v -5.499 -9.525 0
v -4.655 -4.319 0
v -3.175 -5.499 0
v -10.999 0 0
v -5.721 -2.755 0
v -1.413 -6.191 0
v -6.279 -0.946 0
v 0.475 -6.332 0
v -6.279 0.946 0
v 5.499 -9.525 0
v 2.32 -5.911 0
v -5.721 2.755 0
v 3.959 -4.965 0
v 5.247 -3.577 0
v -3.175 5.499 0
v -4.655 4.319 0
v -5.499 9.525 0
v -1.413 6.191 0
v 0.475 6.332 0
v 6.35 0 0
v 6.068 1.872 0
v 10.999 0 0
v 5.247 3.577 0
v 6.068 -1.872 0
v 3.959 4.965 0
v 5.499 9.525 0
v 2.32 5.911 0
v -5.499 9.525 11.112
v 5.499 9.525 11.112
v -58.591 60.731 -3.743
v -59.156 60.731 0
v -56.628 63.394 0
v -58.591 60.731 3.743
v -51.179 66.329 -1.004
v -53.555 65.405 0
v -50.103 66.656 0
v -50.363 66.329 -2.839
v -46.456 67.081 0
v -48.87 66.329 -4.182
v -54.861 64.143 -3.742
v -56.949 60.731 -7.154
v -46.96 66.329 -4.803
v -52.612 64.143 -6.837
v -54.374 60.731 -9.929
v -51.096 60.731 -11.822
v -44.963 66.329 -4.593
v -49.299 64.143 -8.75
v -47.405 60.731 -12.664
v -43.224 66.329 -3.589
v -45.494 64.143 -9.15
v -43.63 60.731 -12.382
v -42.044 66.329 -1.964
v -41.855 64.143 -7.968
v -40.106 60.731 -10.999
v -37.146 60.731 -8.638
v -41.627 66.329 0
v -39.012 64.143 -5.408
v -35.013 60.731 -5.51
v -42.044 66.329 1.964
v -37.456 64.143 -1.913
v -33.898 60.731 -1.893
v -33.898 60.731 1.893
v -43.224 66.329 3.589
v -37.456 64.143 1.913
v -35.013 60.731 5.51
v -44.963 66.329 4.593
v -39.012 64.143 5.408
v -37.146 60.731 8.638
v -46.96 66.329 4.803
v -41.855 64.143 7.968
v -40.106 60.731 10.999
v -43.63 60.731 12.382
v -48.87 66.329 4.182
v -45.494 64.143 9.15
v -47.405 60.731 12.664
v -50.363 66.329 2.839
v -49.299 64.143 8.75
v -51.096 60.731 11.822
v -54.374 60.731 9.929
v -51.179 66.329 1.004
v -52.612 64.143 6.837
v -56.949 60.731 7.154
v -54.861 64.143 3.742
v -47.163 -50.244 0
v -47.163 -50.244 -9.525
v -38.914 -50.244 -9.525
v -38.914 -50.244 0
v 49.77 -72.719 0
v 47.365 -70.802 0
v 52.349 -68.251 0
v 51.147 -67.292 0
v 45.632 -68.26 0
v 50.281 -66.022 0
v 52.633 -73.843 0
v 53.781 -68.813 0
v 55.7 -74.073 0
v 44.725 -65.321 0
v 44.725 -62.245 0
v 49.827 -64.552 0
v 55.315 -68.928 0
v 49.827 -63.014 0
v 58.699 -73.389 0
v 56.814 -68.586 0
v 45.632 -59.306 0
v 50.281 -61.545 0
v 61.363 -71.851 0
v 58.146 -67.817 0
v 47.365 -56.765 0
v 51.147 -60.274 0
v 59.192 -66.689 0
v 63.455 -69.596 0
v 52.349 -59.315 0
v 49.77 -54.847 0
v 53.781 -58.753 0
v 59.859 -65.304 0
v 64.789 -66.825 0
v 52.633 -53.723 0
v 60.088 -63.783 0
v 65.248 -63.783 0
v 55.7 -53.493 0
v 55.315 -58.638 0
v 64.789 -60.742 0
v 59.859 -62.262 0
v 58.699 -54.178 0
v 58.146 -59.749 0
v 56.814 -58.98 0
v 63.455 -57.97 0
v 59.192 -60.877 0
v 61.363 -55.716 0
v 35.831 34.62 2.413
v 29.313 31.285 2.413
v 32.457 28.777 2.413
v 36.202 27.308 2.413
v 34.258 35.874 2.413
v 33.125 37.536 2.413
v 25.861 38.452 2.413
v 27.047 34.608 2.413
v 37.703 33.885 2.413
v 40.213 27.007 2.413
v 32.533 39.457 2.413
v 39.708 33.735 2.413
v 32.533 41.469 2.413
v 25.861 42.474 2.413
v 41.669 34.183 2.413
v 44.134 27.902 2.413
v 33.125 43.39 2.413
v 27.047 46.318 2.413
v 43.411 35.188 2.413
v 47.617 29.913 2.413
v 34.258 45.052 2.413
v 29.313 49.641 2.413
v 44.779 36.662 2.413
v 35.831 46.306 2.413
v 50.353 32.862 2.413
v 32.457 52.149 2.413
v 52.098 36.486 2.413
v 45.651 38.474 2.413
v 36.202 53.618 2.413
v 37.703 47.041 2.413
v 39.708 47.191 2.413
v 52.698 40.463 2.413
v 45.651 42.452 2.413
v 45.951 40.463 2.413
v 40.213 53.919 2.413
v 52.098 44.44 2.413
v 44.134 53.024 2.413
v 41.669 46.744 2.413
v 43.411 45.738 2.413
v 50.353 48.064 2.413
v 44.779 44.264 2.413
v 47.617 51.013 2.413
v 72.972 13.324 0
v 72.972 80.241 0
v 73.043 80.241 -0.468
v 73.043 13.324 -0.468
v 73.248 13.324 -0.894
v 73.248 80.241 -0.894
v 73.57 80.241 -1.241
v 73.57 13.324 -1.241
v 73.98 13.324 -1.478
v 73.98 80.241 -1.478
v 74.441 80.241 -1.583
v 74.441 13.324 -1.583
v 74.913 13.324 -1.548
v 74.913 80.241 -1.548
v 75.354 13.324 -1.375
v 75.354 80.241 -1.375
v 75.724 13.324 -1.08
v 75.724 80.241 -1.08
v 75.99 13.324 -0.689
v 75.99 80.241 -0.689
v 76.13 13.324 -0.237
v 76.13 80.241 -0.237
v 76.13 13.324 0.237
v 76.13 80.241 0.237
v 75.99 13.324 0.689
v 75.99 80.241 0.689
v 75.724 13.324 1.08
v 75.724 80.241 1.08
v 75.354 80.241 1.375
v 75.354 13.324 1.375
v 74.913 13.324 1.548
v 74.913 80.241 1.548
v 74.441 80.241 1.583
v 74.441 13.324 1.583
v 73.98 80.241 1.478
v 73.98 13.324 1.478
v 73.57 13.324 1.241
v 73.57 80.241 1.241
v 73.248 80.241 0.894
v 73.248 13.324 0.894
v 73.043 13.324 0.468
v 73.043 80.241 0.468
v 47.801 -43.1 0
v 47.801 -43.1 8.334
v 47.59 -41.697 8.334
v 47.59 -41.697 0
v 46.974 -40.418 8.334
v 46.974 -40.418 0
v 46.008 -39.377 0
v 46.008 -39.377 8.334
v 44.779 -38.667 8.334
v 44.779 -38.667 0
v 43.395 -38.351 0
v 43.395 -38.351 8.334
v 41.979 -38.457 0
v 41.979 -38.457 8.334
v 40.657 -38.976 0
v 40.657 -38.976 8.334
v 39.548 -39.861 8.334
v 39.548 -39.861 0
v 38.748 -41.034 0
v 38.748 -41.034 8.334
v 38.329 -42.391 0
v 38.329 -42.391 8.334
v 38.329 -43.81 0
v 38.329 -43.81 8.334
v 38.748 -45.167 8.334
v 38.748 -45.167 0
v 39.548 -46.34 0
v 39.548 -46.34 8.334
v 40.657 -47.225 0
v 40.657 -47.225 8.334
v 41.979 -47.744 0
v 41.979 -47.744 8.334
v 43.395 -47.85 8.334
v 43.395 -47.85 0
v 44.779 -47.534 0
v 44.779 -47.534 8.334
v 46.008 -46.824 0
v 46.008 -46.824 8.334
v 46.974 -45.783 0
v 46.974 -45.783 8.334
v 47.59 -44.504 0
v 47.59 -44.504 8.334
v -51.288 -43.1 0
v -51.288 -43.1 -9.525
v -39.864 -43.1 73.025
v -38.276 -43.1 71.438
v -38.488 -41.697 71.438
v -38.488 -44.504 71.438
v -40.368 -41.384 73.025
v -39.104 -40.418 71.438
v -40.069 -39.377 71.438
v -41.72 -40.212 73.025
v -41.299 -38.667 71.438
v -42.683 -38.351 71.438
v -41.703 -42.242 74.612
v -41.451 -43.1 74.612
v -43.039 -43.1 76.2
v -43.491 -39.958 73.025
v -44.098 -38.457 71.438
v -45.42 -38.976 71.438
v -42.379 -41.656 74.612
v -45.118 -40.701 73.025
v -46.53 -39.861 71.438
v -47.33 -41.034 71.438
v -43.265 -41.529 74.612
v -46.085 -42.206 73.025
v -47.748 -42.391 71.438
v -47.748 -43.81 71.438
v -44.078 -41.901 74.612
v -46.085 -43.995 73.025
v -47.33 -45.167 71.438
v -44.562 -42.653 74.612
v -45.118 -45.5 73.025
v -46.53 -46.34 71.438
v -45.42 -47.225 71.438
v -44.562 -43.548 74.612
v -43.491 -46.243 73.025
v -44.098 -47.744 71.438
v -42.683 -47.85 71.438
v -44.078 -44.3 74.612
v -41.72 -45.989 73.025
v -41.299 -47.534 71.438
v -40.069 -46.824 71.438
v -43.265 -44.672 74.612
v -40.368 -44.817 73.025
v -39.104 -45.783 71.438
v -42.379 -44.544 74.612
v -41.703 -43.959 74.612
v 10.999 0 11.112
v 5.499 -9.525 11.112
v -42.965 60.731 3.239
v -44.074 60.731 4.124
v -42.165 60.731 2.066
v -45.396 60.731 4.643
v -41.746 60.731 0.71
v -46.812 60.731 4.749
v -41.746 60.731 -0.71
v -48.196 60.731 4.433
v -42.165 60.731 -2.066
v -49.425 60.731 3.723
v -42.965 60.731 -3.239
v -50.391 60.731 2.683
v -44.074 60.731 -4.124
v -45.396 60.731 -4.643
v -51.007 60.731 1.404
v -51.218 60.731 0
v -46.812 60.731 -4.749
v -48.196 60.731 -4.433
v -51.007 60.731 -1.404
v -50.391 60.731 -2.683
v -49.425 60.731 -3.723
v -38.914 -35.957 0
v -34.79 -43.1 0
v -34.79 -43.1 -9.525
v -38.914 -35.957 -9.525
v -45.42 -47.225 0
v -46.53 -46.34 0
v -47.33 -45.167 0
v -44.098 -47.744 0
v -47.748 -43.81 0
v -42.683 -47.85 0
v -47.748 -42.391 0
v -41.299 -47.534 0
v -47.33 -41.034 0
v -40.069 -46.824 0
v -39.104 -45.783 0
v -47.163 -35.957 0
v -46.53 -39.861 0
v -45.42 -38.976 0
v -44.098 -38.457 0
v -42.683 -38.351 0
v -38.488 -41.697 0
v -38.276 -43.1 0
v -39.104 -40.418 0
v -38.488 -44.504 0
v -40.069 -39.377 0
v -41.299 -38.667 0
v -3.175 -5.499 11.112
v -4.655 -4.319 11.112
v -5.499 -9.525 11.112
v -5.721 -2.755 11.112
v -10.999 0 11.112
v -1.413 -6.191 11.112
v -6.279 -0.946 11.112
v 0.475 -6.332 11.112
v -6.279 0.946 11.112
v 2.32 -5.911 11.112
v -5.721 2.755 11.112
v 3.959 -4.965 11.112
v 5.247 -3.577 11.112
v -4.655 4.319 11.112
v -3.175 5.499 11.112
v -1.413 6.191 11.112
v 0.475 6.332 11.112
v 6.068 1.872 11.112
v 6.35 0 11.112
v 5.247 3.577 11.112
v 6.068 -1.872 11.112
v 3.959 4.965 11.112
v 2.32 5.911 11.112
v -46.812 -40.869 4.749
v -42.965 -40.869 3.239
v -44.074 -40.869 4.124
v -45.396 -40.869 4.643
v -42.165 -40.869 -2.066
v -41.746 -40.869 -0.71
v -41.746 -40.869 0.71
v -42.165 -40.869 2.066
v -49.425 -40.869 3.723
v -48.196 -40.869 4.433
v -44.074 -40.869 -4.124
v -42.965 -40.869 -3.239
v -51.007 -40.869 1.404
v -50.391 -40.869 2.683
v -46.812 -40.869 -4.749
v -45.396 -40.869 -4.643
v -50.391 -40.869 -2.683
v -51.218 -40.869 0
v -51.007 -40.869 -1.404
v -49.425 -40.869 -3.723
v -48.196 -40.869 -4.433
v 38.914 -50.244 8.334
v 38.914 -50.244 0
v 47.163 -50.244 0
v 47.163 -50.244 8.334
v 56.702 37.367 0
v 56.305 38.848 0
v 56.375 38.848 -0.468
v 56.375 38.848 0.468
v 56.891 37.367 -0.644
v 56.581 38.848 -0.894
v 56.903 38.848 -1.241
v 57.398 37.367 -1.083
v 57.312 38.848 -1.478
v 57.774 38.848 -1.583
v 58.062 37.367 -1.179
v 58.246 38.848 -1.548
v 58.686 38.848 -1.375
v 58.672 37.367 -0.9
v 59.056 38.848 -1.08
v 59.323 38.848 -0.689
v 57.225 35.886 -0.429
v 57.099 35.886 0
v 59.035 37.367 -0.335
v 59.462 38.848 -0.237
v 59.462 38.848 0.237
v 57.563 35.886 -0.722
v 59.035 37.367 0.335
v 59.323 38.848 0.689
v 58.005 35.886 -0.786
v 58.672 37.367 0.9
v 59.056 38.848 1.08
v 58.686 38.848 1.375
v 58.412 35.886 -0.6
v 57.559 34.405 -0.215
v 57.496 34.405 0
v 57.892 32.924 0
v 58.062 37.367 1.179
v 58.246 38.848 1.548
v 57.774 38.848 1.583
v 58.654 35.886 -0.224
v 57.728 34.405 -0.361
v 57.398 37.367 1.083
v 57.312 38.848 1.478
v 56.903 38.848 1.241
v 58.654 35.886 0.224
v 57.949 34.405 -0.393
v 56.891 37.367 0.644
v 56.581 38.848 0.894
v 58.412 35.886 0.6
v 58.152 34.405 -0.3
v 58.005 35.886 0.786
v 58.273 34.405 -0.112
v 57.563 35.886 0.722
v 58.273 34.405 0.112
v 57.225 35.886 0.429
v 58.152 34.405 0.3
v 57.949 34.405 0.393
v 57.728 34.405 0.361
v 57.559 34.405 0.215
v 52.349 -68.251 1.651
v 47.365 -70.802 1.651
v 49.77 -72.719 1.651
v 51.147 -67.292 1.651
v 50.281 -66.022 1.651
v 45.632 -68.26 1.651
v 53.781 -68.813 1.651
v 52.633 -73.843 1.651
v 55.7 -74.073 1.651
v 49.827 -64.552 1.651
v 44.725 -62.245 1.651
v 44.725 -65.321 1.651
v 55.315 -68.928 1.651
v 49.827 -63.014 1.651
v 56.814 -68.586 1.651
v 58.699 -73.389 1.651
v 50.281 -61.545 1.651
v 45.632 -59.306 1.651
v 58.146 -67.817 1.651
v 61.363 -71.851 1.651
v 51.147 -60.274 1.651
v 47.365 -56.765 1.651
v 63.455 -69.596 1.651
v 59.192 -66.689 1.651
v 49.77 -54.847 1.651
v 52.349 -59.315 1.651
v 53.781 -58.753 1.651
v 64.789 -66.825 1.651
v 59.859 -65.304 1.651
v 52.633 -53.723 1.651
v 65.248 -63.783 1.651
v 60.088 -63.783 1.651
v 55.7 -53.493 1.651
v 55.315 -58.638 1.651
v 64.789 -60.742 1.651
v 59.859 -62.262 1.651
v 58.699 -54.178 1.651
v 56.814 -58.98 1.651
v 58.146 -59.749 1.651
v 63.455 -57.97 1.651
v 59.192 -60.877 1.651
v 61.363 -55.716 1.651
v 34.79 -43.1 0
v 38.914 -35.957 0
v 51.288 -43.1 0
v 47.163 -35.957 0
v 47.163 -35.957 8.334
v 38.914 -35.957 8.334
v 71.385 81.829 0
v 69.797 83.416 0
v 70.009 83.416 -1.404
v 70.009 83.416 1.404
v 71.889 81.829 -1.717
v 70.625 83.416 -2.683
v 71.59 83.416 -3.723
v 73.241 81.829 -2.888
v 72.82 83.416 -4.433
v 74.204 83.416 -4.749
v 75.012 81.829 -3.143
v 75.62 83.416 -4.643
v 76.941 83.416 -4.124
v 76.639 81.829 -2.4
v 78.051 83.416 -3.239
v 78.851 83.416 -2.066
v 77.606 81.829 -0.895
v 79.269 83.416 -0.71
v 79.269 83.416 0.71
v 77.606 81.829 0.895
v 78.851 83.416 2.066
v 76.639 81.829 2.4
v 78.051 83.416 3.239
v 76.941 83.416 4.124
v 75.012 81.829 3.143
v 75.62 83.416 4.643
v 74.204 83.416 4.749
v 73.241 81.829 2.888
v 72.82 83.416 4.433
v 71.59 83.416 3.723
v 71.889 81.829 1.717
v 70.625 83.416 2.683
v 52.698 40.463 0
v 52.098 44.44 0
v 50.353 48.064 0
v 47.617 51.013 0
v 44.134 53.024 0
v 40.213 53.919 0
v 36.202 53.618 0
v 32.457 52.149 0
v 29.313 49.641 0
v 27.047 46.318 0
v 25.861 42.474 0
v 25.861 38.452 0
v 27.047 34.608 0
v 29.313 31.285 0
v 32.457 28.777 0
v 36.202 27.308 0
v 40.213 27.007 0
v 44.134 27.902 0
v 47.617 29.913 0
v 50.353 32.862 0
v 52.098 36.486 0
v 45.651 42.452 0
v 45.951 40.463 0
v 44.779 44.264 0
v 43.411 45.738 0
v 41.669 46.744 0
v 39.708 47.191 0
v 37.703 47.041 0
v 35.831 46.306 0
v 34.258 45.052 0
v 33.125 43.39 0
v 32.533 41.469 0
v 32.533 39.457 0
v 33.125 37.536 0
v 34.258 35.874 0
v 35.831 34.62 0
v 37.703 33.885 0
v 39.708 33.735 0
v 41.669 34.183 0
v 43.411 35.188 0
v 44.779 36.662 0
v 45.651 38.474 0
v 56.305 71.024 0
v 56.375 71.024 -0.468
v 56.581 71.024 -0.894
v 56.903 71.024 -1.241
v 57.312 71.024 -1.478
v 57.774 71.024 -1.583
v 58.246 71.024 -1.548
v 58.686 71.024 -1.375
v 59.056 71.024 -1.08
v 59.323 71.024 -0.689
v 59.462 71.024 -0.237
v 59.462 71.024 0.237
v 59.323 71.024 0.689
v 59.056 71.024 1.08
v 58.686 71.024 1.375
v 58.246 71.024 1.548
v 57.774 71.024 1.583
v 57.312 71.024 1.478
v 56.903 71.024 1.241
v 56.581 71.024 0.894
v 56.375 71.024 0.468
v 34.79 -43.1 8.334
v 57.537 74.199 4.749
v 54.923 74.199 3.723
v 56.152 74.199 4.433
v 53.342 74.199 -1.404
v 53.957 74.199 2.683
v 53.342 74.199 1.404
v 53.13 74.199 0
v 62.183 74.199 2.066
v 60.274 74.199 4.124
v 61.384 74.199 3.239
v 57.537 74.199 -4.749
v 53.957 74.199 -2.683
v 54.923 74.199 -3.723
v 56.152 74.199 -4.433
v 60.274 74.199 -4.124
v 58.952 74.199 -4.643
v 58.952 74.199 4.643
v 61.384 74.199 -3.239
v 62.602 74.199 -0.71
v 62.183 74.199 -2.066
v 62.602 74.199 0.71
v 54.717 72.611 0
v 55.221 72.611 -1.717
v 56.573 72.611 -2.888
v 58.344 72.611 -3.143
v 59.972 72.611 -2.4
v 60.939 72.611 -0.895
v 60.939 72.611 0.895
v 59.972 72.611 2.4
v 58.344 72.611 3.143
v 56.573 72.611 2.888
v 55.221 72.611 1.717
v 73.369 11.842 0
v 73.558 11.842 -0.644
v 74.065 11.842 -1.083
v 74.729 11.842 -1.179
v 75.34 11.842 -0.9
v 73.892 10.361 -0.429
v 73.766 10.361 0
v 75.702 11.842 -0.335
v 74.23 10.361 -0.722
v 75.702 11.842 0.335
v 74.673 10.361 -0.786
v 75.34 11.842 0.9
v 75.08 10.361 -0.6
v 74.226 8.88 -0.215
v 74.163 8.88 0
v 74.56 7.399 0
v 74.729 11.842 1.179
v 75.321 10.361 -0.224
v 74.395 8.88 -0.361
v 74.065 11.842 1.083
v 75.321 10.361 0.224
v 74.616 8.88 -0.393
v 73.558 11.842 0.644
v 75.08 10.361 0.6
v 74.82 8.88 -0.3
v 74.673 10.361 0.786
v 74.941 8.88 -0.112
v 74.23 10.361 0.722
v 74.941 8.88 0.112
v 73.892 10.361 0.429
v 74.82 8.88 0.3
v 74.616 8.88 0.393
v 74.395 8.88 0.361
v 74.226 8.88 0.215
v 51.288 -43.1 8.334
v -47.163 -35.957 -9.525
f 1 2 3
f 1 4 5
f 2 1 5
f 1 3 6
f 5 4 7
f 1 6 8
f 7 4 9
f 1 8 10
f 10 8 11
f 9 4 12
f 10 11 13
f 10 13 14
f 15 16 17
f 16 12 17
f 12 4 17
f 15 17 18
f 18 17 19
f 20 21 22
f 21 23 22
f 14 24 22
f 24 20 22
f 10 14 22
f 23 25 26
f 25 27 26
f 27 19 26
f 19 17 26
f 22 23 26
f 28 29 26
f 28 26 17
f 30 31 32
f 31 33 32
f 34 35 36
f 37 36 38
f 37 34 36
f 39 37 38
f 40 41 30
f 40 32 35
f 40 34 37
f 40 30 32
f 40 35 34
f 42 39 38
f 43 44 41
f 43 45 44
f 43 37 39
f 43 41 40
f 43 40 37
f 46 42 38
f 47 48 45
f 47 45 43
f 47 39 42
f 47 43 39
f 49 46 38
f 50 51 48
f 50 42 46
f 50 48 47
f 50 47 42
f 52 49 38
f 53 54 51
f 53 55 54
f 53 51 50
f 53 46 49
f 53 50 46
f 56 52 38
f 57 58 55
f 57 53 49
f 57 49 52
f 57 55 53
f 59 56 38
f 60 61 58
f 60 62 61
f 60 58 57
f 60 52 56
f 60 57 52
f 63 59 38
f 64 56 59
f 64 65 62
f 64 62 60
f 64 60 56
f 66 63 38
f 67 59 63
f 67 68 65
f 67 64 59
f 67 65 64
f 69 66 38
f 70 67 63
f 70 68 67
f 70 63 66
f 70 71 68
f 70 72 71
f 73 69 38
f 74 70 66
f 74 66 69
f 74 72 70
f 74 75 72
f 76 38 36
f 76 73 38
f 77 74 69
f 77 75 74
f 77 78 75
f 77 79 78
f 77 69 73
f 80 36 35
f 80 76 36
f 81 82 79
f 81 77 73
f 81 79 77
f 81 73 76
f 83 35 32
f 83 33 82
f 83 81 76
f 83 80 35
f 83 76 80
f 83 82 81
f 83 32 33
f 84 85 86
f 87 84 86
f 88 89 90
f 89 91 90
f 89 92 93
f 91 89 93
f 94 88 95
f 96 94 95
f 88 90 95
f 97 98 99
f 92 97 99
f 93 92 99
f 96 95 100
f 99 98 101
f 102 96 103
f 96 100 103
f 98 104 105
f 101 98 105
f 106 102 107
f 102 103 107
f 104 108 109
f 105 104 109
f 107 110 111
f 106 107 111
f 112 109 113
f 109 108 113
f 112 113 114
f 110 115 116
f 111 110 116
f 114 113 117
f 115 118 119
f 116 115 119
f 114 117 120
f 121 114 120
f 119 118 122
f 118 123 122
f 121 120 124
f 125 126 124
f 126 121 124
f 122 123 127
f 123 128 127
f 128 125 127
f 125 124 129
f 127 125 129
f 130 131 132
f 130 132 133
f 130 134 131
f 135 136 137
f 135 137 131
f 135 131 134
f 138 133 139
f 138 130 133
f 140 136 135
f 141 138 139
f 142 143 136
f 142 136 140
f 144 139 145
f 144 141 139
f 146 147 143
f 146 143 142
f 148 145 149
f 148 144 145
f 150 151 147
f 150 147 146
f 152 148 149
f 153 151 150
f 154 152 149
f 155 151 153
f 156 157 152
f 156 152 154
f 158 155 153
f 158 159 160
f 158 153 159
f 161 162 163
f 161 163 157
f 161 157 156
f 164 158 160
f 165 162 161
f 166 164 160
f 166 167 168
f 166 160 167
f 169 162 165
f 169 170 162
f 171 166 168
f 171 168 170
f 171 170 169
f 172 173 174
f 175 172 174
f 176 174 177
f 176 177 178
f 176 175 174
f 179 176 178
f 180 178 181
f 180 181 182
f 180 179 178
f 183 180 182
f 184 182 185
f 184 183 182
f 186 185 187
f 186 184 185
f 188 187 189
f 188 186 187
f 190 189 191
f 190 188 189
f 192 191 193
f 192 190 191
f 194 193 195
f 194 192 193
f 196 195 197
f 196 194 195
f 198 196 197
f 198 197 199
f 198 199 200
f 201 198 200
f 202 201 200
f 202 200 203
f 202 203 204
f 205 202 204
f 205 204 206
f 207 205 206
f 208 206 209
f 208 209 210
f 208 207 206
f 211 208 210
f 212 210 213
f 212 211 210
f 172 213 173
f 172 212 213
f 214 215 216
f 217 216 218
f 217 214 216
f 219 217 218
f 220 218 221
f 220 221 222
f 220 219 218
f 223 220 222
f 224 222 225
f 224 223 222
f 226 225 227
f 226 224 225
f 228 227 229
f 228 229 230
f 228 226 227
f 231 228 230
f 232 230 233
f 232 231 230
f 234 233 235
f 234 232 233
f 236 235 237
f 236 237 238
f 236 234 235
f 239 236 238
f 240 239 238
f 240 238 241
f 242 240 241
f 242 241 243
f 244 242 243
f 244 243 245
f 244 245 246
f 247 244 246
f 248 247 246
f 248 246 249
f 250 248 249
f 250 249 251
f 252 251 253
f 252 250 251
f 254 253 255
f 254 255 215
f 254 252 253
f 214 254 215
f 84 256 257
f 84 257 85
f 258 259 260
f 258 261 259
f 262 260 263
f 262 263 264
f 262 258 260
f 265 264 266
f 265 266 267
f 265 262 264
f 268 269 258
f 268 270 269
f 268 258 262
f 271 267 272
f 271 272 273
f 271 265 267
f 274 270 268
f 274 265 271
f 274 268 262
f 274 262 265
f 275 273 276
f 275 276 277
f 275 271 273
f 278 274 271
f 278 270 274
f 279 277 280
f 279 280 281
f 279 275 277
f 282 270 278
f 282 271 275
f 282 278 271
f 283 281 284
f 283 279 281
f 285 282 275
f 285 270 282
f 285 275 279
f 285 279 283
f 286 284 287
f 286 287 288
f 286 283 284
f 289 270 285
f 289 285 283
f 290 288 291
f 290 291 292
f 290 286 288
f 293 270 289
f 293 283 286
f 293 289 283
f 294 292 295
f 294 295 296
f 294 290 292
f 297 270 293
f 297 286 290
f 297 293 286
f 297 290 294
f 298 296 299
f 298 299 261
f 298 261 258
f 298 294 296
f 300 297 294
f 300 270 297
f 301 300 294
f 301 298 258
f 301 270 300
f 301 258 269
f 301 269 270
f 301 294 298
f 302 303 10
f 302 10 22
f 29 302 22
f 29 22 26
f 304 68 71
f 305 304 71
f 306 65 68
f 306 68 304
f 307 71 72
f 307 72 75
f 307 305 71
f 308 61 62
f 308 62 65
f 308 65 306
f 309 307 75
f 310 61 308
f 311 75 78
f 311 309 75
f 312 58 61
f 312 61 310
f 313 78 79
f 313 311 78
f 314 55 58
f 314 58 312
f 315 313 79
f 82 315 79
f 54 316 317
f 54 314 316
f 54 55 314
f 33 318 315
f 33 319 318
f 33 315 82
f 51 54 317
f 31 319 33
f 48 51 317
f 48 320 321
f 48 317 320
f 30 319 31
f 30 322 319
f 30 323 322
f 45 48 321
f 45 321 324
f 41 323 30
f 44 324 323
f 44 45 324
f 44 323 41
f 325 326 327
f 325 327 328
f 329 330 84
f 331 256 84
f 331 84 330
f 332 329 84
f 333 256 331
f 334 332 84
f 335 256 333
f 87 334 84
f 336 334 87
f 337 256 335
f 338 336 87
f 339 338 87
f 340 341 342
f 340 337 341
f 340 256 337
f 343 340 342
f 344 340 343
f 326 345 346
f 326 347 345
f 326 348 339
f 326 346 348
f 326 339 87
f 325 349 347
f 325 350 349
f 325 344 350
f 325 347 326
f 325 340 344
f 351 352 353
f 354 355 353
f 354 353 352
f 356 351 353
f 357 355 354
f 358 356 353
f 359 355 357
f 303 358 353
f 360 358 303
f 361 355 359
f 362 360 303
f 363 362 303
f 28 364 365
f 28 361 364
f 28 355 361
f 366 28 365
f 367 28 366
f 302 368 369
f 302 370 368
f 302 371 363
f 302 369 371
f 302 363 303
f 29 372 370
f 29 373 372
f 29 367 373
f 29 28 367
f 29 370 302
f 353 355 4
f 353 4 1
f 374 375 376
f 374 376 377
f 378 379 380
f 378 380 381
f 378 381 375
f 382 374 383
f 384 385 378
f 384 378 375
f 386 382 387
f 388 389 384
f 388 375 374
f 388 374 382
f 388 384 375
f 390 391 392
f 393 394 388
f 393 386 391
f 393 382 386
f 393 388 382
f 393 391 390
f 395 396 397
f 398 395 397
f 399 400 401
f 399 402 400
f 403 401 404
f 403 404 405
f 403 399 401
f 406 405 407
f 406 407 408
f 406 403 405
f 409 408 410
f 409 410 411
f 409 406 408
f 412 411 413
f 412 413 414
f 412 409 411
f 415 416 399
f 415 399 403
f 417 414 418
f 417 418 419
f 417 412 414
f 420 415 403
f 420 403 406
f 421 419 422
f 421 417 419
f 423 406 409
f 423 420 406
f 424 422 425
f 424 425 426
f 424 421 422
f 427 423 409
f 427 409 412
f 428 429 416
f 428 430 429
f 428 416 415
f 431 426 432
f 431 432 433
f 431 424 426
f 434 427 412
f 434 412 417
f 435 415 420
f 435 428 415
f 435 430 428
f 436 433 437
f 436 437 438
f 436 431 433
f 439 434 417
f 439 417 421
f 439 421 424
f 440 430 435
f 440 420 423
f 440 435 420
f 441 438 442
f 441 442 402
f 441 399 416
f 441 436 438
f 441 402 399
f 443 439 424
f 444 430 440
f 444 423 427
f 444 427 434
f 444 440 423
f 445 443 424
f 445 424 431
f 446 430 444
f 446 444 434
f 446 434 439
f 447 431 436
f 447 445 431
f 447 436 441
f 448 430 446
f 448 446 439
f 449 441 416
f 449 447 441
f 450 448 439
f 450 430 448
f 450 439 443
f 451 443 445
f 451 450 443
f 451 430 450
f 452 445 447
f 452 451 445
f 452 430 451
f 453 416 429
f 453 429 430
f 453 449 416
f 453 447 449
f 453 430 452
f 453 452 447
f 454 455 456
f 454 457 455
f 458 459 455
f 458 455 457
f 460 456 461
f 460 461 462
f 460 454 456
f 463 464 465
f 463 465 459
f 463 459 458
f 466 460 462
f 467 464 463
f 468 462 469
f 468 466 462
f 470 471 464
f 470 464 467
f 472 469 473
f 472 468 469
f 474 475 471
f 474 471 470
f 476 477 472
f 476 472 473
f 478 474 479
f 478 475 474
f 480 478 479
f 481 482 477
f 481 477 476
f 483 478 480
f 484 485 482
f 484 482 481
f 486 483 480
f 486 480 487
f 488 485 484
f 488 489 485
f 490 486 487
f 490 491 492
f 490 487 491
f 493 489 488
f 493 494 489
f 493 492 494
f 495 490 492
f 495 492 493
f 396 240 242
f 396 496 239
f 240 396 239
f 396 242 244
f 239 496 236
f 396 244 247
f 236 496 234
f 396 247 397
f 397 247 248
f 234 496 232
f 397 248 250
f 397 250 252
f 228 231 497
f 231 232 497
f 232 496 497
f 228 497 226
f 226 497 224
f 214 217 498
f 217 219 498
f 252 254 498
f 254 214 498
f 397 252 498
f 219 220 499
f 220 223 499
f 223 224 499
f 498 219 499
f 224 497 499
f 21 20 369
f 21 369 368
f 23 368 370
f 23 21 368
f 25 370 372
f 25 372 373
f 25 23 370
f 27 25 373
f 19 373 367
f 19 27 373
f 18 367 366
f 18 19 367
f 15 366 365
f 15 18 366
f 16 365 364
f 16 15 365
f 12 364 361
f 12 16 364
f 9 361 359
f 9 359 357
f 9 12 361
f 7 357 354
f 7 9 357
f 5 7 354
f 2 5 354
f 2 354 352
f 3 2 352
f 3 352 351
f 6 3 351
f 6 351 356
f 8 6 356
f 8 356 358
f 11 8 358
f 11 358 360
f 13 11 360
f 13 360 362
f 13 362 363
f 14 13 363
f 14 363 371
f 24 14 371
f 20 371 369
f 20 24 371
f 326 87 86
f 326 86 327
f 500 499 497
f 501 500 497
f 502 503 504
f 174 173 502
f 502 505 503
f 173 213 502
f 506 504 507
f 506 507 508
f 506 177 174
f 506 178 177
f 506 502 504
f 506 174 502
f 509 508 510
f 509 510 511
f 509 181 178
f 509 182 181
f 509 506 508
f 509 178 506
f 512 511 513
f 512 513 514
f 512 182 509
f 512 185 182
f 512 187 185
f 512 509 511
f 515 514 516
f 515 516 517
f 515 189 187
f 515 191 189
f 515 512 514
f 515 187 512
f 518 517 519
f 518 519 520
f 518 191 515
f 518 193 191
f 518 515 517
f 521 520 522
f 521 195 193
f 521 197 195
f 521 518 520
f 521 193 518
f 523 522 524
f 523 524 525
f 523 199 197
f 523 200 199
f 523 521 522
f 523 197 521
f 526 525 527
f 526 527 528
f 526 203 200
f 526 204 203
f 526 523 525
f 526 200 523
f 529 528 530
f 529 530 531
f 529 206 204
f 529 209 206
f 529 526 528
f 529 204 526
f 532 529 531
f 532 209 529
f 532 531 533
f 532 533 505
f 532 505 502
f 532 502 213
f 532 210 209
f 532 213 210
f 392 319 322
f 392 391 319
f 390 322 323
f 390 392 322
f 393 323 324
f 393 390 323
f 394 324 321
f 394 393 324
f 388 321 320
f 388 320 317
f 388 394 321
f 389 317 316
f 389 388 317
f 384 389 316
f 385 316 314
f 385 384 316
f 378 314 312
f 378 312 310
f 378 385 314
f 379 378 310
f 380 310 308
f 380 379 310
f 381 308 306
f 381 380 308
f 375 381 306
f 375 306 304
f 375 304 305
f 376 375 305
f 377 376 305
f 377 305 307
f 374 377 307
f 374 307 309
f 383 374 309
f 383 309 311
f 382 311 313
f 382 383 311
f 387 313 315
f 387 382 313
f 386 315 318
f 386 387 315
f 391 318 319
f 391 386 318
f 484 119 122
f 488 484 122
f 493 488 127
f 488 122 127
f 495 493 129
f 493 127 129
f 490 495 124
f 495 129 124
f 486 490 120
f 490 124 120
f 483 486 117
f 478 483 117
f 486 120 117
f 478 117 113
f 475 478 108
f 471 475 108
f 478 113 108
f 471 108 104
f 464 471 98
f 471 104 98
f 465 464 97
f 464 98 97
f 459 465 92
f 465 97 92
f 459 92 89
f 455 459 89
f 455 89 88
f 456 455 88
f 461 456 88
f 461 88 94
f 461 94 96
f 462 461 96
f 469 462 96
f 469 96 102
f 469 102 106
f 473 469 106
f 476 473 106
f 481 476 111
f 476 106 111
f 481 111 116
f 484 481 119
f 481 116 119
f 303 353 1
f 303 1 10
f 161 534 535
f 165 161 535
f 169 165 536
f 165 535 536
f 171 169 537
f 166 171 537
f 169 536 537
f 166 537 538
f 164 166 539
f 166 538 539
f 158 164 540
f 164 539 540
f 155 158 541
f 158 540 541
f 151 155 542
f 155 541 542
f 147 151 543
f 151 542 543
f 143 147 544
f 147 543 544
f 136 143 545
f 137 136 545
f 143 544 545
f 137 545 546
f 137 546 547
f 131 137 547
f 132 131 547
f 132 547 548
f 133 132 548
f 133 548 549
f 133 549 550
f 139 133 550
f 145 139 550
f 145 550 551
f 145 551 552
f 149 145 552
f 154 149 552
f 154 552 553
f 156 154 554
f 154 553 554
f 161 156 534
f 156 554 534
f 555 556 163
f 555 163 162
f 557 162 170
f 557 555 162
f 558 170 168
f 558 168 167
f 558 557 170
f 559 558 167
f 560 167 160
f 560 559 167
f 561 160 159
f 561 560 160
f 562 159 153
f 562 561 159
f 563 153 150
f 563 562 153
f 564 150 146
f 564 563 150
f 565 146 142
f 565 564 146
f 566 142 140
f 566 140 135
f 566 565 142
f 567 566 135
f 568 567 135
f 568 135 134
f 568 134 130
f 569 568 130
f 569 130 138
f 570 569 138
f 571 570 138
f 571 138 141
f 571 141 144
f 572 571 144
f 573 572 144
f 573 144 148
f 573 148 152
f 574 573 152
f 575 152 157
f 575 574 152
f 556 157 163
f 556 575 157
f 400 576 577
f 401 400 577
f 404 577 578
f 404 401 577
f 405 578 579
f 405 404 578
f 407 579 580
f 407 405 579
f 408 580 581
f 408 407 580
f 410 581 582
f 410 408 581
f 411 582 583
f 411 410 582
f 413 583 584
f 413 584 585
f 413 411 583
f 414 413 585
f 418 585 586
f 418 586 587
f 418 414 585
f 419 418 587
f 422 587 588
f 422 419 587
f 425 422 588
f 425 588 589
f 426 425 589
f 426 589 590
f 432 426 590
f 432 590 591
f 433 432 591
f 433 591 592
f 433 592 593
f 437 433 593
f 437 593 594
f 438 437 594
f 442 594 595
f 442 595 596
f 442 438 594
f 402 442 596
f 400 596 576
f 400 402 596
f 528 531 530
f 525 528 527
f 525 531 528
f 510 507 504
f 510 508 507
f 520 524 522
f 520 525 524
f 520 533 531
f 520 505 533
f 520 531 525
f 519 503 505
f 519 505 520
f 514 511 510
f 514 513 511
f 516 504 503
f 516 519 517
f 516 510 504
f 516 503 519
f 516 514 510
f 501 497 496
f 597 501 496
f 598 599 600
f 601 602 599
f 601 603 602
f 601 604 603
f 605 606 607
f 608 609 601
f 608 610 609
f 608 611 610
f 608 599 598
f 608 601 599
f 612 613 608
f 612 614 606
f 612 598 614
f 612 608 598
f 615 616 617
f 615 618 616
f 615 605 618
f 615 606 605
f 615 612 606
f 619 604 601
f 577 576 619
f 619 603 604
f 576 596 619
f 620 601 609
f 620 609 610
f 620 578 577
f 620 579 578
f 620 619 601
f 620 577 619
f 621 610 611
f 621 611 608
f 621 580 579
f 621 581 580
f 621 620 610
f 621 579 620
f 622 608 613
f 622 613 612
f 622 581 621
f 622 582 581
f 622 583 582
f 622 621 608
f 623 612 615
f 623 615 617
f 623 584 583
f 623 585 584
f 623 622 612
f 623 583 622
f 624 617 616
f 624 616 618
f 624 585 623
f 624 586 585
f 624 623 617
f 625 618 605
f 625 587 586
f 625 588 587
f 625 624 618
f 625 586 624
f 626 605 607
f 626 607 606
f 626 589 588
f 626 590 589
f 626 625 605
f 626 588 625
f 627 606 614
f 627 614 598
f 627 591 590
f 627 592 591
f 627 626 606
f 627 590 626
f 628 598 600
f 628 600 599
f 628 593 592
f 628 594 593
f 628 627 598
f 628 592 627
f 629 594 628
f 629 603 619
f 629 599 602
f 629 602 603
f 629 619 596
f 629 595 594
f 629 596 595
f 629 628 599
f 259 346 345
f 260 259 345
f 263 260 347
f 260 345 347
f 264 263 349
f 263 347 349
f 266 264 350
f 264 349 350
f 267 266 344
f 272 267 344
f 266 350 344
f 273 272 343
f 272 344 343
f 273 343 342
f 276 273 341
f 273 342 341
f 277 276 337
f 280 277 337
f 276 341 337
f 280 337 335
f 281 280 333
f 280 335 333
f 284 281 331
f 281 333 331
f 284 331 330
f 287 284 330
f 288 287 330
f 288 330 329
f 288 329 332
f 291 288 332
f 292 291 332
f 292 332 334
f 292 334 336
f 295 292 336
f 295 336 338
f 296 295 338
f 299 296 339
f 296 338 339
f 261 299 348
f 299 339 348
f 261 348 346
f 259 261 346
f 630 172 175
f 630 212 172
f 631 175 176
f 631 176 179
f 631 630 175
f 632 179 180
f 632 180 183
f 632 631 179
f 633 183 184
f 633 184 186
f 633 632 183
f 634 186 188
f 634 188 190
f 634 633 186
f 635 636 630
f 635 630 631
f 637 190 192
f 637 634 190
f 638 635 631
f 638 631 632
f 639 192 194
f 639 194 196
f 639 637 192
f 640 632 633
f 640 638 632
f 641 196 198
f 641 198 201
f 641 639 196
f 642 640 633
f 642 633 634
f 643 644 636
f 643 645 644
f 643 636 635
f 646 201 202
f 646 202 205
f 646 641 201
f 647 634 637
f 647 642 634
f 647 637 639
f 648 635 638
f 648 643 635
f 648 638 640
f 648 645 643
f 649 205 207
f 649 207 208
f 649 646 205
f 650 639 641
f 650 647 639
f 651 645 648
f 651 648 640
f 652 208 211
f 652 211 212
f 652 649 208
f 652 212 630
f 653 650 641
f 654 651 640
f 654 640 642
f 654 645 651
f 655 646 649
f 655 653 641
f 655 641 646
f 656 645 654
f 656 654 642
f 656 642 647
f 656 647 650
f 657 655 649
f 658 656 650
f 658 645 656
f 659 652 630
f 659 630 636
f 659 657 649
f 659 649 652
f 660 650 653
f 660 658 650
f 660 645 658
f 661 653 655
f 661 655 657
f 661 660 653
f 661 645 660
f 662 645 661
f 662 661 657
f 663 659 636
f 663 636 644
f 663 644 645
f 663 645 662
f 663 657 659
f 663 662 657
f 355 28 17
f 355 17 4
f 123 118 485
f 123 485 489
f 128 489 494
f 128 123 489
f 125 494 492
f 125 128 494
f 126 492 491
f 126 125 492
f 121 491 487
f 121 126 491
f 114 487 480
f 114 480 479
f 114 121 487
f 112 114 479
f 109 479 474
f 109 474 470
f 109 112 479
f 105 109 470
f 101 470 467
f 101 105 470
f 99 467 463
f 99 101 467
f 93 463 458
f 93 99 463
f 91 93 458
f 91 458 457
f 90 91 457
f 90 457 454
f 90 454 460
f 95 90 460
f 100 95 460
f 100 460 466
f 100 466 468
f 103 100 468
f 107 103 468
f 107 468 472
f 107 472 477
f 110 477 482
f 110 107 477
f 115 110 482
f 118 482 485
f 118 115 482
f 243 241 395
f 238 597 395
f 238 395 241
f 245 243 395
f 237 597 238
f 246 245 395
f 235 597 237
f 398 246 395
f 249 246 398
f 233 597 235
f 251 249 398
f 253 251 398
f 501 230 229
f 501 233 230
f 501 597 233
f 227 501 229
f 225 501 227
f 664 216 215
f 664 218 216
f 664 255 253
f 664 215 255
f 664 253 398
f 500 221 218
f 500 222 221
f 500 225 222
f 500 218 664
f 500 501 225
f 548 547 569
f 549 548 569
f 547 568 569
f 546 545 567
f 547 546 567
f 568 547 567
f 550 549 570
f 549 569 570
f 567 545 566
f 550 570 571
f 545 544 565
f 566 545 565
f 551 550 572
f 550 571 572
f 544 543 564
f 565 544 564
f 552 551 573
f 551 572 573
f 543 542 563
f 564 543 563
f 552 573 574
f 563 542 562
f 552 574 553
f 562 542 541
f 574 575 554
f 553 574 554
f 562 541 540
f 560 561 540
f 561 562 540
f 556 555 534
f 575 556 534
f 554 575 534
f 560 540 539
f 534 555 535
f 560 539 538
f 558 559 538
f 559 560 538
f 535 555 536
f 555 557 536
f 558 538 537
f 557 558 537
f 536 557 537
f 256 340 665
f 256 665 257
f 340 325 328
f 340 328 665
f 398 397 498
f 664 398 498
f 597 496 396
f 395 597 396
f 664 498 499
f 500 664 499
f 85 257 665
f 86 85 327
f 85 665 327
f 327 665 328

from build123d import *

# Parameters (mm, degrees)
F0_R      = 6.35
F1_DEPTH  = 11.1125
F2_R      = 13.49375
F2_R_2    = 6.746875
F3_DEPTH  = 2.413
F6_R      = 4.7625
F7_DEPTH  = 8.334375
F8_R      = 10.31875
F8_R_2    = 5.159375
F9_DEPTH  = 1.651
F14_DEPTH = 9.525
F15_DEPTH = 76.2
F16_SIZE  = 4.7625


# Not quite as in the source:
# - a length typed as a fraction of an inch, garbled in the dataset ("3 / 203.2 mm" for 3/8 in), is restored


with BuildPart() as f1:
    # F0 (on Top) → F1 (new body)
    with BuildSketch(Plane.XY):
        Polygon((5.499261314, 9.525), (-5.499261314, 9.525), (-10.9985226281, 0), (-5.499261314, -9.525), (5.499261314, -9.525), (10.9985226281, 0), align=None)
        Circle(F0_R, mode=Mode.SUBTRACT)
    extrude(amount=F1_DEPTH)


with BuildPart() as f3:
    # F2 (on Top) → F3 (new body)
    with BuildSketch(Plane.XY):
        with Locations((39.2041653395, 40.4630117118)):
            Circle(F2_R)
        with Locations((39.2041653395, 40.4630117118)):
            Circle(F2_R_2, mode=Mode.SUBTRACT)
    extrude(amount=F3_DEPTH)


with BuildPart() as f5:
    # F4 (on Top) → F5 (revolve)
    with BuildSketch(Plane.XY):
        with BuildLine():
            Line((-46.4556922868, -40.868859118), (-46.4556922868, 60.731140882))
            Line((-46.4556922868, 60.731140882), (-46.4556922868, 67.081140882))
            ThreePointArc((-46.4556922868, 67.081140882), (-53.5552081154, 65.4051725392), (-59.1556922868, 60.731140882))
            Line((-59.1556922868, 60.731140882), (-51.2181922868, 60.731140882))
            Line((-51.2181922868, 60.731140882), (-51.2181922868, -40.868859118))
            Line((-51.2181922868, -40.868859118), (-46.4556922868, -40.868859118))
        make_face()
    revolve(axis=Axis((-46.4556922868, 9.931140882, 0), (0, -1, 0)))


with BuildPart() as f7:
    # F6 (on Top) → F7 (new body)
    with BuildSketch(Plane.XY):
        Polygon((47.1631364482, -35.9566703924), (38.9142444772, -35.9566703924), (34.7897984917, -43.1004203924), (38.9142444772, -50.2441703924), (47.1631364482, -50.2441703924), (51.2875824338, -43.1004203924), align=None)
        with Locations((43.0386904627, -43.1004203924)):
            Circle(F6_R, mode=Mode.SUBTRACT)
    extrude(amount=F7_DEPTH)


with BuildPart() as f9:
    # F8 (on Top) → F9 (new body)
    with BuildSketch(Plane.XY):
        with Locations((54.9289397895, -63.7831166387)):
            Circle(F8_R)
        with Locations((54.9289397895, -63.7831166387)):
            Circle(F8_R_2, mode=Mode.SUBTRACT)
    extrude(amount=F9_DEPTH)


with BuildPart() as f11:
    # F10 (on Top) → F11 (revolve)
    with BuildSketch(Plane.XY):
        Polygon((57.8924338935, 74.1986898454), (53.1299338935, 74.1986898454), (56.3049338935, 71.0236898454), (56.3049338935, 38.8483205024), (57.8924338935, 32.9236898454), align=None)
    revolve(axis=Axis((57.8924338935, 53.5611898454, 0), (0, -1, 0)))


with BuildPart() as f13:
    # F12 (on Top) → F13 (revolve)
    with BuildSketch(Plane.XY):
        Polygon((74.5598336721, 83.4161932281), (69.7973336721, 83.4161932281), (72.9723336721, 80.2411932281), (72.9723336721, 13.3236167875), (74.5598336721, 7.3989861305), align=None)
    revolve(axis=Axis((74.5598336721, 45.4075896793, 0), (0, -1, 0)))


with BuildPart() as f14:
    # F6 (on Top) → F14 (new body)
    with BuildSketch(Plane.XY):
        Polygon((-34.7897984917, -43.1004203924), (-38.9142444772, -35.9566703924), (-47.1631364482, -35.9566703924), (-51.2875824338, -43.1004203924), (-47.1631364482, -50.2441703924), (-38.9142444772, -50.2441703924), align=None)
        with Locations((-43.0386904627, -43.1004203924)):
            Circle(F6_R, mode=Mode.SUBTRACT)
        with Locations((-43.0386904627, -43.1004203924)):
            Circle(F6_R)
    extrude(amount=-F14_DEPTH)

    # F6 (on Top) → F15 (join)
    with BuildSketch(Plane.XY):
        with Locations((-43.0386904627, -43.1004203924)):
            Circle(F6_R)
    extrude(amount=F15_DEPTH)

    # F16
    f16_edges = [f14.edges().sort_by_distance(p)[0] for p in [
        (-47.80119, -43.10042, 76.2),
    ]]
    chamfer(f16_edges, length=F16_SIZE)


solid = Compound([f1.part, f3.part, f5.part, f7.part, f9.part, f11.part, f13.part, f14.part])
